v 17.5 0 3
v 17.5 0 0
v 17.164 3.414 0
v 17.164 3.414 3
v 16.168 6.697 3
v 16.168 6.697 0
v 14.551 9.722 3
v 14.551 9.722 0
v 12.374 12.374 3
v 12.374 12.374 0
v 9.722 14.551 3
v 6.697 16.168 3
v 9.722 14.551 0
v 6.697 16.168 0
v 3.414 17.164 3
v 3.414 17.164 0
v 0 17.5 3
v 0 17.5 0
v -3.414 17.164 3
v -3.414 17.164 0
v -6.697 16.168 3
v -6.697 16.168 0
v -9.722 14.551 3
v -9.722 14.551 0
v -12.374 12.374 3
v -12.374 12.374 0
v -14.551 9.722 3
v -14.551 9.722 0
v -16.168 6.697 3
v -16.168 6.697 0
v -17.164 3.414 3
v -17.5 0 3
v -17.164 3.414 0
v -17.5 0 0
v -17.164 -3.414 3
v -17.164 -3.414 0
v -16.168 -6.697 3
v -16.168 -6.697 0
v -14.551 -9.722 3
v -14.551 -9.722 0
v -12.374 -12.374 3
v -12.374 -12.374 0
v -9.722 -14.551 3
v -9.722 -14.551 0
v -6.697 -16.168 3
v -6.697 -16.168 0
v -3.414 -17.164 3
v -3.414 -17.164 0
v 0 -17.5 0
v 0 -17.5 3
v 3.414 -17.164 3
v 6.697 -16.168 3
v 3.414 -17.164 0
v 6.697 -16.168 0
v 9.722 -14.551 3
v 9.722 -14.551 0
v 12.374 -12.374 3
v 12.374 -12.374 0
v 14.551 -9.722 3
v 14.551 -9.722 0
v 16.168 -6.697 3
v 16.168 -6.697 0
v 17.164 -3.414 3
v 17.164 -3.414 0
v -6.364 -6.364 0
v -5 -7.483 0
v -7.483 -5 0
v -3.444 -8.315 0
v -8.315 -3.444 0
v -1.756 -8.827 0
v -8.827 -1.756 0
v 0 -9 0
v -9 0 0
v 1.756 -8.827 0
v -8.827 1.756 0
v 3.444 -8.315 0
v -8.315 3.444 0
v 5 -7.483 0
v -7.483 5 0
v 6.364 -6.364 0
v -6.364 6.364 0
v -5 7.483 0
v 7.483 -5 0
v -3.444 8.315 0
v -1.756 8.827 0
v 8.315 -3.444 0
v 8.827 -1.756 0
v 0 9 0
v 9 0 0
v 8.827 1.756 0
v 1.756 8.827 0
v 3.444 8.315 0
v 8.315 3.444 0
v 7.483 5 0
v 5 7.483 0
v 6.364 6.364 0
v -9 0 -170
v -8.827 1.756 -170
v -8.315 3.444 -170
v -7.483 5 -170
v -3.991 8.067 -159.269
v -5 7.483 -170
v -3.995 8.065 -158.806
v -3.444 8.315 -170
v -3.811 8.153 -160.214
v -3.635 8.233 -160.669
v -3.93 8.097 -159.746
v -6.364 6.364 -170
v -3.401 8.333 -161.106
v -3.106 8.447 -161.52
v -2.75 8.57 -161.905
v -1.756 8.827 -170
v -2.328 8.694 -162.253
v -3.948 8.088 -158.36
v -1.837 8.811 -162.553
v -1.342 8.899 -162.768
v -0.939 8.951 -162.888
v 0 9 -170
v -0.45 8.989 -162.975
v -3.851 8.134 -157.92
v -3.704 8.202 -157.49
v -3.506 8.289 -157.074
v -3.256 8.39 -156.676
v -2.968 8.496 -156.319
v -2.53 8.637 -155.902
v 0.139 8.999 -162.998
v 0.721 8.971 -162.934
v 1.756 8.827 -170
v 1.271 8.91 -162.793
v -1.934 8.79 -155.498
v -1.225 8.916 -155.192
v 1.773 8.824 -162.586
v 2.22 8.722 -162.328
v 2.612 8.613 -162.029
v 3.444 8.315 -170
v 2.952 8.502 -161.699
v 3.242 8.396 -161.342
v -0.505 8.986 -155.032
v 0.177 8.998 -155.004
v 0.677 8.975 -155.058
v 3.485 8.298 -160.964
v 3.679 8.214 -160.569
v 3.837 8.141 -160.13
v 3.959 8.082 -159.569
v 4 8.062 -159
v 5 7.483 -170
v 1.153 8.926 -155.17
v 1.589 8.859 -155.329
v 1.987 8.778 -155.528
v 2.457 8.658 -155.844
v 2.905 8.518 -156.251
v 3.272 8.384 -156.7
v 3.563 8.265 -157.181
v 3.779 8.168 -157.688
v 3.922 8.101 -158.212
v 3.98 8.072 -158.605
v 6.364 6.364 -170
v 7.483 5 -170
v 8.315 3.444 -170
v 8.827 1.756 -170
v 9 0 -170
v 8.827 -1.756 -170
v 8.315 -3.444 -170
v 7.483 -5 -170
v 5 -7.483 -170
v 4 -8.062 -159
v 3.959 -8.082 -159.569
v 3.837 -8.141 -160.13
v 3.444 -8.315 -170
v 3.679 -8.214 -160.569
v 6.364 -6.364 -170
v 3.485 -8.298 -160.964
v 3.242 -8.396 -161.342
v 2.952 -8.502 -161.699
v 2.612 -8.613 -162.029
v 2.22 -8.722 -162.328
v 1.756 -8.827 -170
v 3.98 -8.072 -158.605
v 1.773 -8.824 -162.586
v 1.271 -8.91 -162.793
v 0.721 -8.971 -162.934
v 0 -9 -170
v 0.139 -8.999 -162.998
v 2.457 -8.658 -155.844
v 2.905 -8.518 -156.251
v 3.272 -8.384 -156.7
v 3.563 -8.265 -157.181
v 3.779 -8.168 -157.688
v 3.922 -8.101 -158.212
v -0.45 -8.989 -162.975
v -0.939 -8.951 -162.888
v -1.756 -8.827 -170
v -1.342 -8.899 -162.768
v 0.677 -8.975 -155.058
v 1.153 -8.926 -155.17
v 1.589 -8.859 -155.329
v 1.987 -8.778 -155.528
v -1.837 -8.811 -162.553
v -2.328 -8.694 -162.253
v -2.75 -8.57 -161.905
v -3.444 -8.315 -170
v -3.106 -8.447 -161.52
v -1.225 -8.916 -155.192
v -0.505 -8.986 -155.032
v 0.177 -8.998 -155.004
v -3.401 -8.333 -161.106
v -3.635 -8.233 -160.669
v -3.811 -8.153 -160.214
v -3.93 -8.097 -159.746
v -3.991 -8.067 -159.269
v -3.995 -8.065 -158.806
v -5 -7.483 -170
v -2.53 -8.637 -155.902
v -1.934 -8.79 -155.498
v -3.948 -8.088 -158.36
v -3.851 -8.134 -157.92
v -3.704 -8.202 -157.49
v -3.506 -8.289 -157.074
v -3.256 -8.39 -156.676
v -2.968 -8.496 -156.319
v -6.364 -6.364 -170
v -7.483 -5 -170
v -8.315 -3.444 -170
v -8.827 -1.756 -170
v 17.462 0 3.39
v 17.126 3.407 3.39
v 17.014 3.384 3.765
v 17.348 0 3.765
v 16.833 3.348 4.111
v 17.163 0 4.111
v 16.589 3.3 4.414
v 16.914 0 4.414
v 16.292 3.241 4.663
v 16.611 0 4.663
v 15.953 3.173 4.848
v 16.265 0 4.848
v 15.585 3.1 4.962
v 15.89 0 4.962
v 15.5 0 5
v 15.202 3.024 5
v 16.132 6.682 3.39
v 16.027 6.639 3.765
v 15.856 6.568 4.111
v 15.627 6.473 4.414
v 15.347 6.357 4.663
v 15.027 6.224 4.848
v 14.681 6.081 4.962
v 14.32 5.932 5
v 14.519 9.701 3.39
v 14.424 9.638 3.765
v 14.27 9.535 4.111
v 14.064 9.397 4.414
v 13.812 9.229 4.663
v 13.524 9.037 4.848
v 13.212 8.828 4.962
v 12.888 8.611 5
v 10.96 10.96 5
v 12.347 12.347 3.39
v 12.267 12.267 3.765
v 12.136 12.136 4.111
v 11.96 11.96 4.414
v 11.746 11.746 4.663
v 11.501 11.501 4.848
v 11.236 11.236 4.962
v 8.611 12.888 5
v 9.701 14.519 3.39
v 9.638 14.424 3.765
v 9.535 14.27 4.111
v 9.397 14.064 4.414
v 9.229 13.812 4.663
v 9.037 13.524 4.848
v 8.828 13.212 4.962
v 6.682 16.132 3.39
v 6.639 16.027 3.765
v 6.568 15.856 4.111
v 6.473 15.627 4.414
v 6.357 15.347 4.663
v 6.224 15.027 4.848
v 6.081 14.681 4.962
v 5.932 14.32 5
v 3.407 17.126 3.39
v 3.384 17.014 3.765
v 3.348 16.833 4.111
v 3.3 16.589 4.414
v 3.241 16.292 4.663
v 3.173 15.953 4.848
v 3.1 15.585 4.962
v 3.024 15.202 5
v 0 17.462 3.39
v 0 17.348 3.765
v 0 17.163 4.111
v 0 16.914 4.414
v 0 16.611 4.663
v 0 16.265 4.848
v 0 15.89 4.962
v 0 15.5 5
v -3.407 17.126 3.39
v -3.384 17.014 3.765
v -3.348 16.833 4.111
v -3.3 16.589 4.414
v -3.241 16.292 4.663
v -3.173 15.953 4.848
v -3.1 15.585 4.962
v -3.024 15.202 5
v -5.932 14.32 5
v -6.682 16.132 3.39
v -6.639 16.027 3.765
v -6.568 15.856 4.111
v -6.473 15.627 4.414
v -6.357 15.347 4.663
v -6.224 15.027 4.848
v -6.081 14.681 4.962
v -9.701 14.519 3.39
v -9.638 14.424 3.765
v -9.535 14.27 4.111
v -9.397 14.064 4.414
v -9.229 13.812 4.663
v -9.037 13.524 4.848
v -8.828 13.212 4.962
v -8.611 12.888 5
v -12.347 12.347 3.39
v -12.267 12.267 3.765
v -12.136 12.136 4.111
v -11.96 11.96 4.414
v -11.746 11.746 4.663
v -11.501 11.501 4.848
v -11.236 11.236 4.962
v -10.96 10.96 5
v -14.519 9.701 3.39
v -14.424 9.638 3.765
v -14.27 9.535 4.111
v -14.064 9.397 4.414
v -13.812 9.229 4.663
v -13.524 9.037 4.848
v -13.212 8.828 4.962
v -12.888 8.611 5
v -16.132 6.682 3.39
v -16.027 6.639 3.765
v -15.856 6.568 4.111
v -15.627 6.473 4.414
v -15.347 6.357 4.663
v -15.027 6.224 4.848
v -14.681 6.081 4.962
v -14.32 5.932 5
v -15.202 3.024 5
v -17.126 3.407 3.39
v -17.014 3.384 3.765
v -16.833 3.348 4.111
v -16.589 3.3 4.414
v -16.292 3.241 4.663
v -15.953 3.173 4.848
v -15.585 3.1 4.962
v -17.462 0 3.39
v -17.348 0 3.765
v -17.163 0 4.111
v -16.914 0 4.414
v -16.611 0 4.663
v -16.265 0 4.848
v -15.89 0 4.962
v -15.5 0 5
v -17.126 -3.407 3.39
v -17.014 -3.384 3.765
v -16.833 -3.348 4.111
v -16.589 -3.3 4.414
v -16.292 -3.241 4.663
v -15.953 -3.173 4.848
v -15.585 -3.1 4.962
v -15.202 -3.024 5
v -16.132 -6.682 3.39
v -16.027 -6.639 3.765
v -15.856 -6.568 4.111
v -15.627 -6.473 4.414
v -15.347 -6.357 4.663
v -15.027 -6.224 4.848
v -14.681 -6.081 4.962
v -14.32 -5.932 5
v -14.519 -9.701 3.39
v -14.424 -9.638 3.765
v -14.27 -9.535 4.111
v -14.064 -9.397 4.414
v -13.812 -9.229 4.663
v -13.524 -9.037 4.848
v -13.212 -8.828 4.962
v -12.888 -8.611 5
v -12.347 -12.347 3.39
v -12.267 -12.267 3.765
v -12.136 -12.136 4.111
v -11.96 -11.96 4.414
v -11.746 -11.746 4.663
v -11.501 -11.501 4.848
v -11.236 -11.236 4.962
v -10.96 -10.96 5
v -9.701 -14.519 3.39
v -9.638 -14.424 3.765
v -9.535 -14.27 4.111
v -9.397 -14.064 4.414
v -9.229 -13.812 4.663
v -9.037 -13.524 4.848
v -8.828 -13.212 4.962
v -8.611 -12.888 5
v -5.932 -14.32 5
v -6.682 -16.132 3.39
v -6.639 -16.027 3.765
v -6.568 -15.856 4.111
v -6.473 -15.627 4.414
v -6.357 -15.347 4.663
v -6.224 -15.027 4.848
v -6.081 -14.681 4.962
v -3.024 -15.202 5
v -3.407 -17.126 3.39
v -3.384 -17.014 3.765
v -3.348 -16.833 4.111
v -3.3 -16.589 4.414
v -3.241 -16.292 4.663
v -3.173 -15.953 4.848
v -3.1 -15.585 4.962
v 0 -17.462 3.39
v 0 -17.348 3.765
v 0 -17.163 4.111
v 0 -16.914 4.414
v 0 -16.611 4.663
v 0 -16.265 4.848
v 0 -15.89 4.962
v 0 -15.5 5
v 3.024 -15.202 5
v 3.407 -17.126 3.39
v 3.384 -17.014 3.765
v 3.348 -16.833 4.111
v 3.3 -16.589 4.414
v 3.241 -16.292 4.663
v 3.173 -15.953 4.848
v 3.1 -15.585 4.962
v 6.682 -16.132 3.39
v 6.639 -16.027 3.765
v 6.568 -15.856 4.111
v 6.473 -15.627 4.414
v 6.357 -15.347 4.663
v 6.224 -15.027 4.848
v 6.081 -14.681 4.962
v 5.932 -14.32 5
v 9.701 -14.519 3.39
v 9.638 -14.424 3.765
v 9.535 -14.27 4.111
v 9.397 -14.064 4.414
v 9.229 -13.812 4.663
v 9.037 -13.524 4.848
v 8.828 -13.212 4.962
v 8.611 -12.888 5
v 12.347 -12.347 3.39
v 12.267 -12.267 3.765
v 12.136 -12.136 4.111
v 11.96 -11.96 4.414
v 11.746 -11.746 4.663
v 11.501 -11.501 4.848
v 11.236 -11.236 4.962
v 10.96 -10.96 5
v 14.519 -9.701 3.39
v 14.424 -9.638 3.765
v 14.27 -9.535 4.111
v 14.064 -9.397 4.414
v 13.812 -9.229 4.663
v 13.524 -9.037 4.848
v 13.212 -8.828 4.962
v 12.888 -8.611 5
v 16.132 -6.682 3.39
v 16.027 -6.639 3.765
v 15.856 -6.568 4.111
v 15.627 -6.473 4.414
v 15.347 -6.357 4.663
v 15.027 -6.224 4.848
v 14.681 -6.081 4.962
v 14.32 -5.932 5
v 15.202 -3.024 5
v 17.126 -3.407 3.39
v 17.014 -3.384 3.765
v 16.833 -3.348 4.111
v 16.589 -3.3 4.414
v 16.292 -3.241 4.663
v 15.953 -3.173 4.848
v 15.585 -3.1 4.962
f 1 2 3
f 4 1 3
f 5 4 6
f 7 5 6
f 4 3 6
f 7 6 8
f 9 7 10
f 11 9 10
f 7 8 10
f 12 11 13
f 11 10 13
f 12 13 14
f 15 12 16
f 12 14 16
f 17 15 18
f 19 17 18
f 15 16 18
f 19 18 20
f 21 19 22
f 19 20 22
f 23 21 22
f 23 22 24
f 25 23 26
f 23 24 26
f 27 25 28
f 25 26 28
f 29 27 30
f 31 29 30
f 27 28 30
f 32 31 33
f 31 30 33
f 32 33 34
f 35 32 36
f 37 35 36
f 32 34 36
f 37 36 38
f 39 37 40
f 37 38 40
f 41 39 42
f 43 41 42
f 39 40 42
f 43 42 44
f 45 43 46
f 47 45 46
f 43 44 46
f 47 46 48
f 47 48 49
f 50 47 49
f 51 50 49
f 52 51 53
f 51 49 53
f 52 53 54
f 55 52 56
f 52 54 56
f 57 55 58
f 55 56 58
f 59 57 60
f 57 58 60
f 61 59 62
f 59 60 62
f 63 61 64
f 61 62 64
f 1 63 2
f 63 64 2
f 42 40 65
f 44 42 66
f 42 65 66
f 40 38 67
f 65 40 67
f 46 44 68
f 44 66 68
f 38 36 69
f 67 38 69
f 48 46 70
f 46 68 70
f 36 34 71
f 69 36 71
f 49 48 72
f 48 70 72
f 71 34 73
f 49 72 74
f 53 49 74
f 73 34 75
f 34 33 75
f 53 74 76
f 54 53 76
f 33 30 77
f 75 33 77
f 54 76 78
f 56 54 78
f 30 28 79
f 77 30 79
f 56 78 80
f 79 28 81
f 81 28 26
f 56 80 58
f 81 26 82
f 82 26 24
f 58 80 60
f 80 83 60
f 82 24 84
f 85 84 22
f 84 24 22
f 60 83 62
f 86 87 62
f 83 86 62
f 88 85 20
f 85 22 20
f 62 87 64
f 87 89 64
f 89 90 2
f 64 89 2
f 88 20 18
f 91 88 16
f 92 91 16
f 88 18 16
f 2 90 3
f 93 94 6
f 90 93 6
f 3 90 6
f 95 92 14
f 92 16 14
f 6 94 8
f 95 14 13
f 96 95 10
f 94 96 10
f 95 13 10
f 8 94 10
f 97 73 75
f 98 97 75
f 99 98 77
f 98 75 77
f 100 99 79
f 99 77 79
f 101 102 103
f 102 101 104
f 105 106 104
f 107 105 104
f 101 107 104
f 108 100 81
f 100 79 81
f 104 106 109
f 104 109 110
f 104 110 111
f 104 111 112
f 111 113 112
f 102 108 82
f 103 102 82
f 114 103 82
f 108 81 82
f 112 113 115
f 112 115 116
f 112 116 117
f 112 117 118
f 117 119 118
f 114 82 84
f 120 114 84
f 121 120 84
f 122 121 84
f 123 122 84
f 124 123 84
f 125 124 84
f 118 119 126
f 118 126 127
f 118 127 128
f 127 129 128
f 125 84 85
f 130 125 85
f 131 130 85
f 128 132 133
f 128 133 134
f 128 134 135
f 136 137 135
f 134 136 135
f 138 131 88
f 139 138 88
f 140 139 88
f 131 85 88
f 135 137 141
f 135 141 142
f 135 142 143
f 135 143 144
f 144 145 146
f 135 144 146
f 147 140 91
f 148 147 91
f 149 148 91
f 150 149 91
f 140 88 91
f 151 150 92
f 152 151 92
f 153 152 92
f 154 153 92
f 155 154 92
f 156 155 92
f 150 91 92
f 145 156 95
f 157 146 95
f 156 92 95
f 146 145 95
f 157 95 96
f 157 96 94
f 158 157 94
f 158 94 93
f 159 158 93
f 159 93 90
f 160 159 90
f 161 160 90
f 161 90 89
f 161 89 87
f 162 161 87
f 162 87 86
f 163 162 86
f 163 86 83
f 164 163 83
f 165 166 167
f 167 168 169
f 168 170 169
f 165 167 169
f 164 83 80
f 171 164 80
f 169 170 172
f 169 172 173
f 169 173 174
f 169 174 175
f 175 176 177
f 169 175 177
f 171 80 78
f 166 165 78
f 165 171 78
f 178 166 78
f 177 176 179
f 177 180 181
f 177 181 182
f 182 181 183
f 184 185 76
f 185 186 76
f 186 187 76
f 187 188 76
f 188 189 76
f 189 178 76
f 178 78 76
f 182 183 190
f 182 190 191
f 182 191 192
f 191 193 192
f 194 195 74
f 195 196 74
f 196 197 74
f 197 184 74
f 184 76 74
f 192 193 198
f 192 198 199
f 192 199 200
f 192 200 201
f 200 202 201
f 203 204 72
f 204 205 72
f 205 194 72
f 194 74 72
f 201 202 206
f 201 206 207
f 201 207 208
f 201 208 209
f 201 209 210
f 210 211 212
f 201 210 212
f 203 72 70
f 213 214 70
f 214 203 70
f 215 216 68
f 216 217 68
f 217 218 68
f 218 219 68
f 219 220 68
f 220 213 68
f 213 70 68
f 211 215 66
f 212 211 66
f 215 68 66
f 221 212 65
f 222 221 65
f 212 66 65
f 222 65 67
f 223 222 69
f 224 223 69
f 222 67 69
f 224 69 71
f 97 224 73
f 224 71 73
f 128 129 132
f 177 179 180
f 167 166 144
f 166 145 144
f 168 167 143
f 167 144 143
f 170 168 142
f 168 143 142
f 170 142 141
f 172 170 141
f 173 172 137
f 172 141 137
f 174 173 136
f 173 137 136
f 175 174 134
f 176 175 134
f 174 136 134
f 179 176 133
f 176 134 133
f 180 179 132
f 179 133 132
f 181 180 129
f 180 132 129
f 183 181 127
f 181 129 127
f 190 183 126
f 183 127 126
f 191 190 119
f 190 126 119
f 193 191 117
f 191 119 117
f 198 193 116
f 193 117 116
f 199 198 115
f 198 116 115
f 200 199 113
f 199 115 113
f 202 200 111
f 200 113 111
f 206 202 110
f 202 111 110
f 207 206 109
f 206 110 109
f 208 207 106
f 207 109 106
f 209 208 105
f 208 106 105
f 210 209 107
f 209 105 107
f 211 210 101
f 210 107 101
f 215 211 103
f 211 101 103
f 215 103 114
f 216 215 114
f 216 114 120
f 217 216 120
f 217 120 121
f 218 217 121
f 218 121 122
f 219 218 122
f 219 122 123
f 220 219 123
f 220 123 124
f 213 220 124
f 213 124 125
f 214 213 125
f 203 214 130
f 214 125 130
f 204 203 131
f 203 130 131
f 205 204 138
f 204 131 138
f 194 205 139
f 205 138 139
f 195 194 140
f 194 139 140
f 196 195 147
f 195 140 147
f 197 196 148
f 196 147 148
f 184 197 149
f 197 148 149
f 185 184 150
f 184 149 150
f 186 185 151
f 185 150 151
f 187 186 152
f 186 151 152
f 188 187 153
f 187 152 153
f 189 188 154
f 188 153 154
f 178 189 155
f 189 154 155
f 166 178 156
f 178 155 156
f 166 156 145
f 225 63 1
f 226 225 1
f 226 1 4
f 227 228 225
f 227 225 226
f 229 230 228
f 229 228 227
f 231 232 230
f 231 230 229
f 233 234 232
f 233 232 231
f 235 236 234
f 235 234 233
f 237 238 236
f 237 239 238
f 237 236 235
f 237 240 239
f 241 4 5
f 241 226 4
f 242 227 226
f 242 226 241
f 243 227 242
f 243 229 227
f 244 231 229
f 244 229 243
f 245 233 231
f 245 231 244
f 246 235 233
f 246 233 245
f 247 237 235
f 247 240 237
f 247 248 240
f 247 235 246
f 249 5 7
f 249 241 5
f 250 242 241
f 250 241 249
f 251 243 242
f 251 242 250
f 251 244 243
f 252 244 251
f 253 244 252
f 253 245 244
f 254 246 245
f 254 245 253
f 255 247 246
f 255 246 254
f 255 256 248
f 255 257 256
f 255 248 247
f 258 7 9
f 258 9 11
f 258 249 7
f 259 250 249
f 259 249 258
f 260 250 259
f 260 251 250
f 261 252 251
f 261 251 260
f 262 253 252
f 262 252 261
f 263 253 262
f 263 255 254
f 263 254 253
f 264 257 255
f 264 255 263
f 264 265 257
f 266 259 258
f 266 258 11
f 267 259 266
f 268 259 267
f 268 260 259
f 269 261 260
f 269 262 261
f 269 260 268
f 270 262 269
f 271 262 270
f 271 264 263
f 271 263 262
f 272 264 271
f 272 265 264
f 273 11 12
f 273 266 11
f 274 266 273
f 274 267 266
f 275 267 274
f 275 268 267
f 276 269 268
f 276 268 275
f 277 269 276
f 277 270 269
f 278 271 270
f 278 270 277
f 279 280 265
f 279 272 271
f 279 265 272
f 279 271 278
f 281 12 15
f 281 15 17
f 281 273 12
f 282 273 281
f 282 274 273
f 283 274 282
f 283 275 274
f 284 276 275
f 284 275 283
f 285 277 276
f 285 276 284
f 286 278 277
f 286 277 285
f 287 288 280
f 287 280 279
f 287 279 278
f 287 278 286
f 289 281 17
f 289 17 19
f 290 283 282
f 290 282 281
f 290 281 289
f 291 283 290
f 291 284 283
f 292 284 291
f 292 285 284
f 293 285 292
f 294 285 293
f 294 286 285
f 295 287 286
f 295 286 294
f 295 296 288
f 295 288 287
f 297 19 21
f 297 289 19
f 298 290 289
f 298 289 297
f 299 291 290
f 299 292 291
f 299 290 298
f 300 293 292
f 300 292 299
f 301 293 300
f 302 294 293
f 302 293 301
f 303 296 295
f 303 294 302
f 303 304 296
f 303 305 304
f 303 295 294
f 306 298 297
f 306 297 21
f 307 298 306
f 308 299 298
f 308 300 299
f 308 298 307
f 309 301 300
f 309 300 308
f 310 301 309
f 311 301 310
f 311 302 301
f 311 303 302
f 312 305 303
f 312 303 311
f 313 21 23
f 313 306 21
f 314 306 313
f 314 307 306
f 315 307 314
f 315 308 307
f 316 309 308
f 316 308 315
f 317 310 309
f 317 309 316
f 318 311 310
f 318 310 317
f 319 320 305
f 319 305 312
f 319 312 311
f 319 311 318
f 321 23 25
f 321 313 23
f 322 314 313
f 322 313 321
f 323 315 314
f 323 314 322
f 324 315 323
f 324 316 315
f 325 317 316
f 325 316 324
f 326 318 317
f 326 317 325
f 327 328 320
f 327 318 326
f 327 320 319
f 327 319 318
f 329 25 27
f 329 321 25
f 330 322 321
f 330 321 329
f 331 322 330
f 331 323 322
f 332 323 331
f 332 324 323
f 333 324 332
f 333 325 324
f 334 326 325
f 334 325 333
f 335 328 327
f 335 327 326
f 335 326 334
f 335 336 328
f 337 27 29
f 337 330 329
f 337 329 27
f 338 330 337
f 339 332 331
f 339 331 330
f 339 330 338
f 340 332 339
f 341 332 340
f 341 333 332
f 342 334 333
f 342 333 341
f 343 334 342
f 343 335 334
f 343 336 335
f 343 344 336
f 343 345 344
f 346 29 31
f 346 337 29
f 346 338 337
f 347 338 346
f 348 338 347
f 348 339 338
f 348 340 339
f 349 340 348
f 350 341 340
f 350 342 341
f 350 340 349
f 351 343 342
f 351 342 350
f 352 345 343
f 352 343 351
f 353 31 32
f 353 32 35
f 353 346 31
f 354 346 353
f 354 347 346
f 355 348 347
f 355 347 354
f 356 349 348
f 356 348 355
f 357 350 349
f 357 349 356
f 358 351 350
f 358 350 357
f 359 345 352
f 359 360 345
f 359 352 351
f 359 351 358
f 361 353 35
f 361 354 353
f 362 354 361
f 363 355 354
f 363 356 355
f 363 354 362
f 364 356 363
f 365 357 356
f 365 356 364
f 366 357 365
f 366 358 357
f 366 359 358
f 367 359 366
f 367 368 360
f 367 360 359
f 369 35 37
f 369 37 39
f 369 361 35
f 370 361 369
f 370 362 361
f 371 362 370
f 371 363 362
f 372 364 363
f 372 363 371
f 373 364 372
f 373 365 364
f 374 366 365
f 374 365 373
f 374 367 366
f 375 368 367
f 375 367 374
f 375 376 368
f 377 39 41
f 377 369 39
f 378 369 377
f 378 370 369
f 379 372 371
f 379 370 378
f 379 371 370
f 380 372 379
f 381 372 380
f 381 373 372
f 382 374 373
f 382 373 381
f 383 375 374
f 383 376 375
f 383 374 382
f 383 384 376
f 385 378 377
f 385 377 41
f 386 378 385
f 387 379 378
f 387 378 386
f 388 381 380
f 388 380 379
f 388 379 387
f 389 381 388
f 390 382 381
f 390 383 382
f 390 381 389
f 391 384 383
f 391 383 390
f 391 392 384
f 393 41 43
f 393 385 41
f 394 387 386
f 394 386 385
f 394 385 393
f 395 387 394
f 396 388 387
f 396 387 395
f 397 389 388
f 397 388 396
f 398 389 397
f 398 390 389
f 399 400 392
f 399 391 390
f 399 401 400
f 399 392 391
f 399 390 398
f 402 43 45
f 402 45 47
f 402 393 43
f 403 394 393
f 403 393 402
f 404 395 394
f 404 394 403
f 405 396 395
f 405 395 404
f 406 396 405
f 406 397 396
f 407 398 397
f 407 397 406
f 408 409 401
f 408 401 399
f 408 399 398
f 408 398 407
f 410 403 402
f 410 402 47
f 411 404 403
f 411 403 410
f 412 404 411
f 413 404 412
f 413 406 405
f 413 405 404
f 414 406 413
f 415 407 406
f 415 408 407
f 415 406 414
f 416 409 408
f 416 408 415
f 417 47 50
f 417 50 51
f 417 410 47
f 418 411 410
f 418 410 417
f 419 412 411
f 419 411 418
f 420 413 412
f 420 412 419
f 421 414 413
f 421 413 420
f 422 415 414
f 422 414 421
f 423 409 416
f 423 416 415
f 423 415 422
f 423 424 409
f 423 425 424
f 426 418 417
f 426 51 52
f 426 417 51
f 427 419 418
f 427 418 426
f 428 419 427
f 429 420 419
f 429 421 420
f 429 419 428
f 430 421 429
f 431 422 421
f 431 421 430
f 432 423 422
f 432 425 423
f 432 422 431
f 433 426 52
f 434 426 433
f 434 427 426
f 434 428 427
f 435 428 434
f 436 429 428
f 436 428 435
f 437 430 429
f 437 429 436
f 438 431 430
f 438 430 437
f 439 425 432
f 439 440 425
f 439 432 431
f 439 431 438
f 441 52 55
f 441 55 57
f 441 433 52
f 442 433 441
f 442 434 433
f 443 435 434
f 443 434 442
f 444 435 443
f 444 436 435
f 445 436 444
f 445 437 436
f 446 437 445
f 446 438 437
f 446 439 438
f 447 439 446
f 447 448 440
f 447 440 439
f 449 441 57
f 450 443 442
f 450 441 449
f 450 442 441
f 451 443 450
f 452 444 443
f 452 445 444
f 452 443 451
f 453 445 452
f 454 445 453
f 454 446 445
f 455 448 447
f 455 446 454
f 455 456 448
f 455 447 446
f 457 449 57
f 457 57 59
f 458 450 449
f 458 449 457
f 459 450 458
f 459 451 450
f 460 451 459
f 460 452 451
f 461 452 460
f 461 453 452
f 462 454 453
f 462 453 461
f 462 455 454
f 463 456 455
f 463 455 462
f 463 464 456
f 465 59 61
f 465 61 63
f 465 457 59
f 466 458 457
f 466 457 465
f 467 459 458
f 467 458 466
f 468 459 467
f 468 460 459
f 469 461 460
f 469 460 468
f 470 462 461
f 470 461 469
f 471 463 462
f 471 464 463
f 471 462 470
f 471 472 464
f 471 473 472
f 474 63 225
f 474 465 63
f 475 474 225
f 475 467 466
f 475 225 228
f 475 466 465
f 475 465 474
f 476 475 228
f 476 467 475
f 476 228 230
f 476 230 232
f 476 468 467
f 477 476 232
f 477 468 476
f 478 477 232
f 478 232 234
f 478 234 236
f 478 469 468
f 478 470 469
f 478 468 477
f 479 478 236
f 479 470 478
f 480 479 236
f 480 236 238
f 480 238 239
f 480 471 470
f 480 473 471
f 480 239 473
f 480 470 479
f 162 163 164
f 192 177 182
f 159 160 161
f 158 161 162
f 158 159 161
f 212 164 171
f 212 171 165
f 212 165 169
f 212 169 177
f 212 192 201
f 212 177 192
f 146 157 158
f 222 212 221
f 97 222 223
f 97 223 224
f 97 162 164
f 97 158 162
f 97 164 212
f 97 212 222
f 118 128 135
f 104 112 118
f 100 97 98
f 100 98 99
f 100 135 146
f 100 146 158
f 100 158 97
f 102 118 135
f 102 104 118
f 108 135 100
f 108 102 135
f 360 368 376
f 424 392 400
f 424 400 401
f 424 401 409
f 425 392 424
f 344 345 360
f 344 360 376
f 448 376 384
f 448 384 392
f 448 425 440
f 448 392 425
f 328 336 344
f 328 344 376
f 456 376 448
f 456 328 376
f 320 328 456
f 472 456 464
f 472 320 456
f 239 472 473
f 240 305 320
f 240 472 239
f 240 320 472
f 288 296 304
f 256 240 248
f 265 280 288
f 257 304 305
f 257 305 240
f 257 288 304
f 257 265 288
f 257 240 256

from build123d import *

# Parameters (mm, degrees)
IZIM1_R                     = 17.5
Y_KSEKLIK_EKSTR_ZYON1_DEPTH = 5
RADYUS1_R                   = 2
IZIM2_R                     = 9
Y_KSEKLIK_EKSTR_ZYON2_DEPTH = 170
IZIM3_R                     = 4
KES_EKSTR_ZYON1_DEPTH       = 85


with BuildPart() as part:
    # Çizim1 → Yükseklik-Ekstrüzyon1 (new body)
    with BuildSketch(Plane.XY):
        Circle(IZIM1_R)
    extrude(amount=Y_KSEKLIK_EKSTR_ZYON1_DEPTH)

    # Radyus1
    radyus1_edges = [part.edges().sort_by_distance(p)[0] for p in [
        (-17.5, 0, 5),
    ]]
    fillet(radyus1_edges, radius=RADYUS1_R)

    # Çizim2 → Yükseklik-Ekstrüzyon2 (add)
    with BuildSketch(Plane(origin=(0, 0, 0), x_dir=(-1, 0, 0), z_dir=(0, 0, -1))):
        Circle(IZIM2_R)
    extrude(amount=Y_KSEKLIK_EKSTR_ZYON2_DEPTH)

    # Çizim3 → Kes-Ekstrüzyon1 (cut, symmetric)
    with BuildSketch(Plane(origin=(0, 0, 0), x_dir=(1, 0, 0), z_dir=(0, 1, 0))):
        with Locations((0, 159)):
            Circle(IZIM3_R)
    extrude(amount=KES_EKSTR_ZYON1_DEPTH, both=True, mode=Mode.SUBTRACT)


solid = part.part
